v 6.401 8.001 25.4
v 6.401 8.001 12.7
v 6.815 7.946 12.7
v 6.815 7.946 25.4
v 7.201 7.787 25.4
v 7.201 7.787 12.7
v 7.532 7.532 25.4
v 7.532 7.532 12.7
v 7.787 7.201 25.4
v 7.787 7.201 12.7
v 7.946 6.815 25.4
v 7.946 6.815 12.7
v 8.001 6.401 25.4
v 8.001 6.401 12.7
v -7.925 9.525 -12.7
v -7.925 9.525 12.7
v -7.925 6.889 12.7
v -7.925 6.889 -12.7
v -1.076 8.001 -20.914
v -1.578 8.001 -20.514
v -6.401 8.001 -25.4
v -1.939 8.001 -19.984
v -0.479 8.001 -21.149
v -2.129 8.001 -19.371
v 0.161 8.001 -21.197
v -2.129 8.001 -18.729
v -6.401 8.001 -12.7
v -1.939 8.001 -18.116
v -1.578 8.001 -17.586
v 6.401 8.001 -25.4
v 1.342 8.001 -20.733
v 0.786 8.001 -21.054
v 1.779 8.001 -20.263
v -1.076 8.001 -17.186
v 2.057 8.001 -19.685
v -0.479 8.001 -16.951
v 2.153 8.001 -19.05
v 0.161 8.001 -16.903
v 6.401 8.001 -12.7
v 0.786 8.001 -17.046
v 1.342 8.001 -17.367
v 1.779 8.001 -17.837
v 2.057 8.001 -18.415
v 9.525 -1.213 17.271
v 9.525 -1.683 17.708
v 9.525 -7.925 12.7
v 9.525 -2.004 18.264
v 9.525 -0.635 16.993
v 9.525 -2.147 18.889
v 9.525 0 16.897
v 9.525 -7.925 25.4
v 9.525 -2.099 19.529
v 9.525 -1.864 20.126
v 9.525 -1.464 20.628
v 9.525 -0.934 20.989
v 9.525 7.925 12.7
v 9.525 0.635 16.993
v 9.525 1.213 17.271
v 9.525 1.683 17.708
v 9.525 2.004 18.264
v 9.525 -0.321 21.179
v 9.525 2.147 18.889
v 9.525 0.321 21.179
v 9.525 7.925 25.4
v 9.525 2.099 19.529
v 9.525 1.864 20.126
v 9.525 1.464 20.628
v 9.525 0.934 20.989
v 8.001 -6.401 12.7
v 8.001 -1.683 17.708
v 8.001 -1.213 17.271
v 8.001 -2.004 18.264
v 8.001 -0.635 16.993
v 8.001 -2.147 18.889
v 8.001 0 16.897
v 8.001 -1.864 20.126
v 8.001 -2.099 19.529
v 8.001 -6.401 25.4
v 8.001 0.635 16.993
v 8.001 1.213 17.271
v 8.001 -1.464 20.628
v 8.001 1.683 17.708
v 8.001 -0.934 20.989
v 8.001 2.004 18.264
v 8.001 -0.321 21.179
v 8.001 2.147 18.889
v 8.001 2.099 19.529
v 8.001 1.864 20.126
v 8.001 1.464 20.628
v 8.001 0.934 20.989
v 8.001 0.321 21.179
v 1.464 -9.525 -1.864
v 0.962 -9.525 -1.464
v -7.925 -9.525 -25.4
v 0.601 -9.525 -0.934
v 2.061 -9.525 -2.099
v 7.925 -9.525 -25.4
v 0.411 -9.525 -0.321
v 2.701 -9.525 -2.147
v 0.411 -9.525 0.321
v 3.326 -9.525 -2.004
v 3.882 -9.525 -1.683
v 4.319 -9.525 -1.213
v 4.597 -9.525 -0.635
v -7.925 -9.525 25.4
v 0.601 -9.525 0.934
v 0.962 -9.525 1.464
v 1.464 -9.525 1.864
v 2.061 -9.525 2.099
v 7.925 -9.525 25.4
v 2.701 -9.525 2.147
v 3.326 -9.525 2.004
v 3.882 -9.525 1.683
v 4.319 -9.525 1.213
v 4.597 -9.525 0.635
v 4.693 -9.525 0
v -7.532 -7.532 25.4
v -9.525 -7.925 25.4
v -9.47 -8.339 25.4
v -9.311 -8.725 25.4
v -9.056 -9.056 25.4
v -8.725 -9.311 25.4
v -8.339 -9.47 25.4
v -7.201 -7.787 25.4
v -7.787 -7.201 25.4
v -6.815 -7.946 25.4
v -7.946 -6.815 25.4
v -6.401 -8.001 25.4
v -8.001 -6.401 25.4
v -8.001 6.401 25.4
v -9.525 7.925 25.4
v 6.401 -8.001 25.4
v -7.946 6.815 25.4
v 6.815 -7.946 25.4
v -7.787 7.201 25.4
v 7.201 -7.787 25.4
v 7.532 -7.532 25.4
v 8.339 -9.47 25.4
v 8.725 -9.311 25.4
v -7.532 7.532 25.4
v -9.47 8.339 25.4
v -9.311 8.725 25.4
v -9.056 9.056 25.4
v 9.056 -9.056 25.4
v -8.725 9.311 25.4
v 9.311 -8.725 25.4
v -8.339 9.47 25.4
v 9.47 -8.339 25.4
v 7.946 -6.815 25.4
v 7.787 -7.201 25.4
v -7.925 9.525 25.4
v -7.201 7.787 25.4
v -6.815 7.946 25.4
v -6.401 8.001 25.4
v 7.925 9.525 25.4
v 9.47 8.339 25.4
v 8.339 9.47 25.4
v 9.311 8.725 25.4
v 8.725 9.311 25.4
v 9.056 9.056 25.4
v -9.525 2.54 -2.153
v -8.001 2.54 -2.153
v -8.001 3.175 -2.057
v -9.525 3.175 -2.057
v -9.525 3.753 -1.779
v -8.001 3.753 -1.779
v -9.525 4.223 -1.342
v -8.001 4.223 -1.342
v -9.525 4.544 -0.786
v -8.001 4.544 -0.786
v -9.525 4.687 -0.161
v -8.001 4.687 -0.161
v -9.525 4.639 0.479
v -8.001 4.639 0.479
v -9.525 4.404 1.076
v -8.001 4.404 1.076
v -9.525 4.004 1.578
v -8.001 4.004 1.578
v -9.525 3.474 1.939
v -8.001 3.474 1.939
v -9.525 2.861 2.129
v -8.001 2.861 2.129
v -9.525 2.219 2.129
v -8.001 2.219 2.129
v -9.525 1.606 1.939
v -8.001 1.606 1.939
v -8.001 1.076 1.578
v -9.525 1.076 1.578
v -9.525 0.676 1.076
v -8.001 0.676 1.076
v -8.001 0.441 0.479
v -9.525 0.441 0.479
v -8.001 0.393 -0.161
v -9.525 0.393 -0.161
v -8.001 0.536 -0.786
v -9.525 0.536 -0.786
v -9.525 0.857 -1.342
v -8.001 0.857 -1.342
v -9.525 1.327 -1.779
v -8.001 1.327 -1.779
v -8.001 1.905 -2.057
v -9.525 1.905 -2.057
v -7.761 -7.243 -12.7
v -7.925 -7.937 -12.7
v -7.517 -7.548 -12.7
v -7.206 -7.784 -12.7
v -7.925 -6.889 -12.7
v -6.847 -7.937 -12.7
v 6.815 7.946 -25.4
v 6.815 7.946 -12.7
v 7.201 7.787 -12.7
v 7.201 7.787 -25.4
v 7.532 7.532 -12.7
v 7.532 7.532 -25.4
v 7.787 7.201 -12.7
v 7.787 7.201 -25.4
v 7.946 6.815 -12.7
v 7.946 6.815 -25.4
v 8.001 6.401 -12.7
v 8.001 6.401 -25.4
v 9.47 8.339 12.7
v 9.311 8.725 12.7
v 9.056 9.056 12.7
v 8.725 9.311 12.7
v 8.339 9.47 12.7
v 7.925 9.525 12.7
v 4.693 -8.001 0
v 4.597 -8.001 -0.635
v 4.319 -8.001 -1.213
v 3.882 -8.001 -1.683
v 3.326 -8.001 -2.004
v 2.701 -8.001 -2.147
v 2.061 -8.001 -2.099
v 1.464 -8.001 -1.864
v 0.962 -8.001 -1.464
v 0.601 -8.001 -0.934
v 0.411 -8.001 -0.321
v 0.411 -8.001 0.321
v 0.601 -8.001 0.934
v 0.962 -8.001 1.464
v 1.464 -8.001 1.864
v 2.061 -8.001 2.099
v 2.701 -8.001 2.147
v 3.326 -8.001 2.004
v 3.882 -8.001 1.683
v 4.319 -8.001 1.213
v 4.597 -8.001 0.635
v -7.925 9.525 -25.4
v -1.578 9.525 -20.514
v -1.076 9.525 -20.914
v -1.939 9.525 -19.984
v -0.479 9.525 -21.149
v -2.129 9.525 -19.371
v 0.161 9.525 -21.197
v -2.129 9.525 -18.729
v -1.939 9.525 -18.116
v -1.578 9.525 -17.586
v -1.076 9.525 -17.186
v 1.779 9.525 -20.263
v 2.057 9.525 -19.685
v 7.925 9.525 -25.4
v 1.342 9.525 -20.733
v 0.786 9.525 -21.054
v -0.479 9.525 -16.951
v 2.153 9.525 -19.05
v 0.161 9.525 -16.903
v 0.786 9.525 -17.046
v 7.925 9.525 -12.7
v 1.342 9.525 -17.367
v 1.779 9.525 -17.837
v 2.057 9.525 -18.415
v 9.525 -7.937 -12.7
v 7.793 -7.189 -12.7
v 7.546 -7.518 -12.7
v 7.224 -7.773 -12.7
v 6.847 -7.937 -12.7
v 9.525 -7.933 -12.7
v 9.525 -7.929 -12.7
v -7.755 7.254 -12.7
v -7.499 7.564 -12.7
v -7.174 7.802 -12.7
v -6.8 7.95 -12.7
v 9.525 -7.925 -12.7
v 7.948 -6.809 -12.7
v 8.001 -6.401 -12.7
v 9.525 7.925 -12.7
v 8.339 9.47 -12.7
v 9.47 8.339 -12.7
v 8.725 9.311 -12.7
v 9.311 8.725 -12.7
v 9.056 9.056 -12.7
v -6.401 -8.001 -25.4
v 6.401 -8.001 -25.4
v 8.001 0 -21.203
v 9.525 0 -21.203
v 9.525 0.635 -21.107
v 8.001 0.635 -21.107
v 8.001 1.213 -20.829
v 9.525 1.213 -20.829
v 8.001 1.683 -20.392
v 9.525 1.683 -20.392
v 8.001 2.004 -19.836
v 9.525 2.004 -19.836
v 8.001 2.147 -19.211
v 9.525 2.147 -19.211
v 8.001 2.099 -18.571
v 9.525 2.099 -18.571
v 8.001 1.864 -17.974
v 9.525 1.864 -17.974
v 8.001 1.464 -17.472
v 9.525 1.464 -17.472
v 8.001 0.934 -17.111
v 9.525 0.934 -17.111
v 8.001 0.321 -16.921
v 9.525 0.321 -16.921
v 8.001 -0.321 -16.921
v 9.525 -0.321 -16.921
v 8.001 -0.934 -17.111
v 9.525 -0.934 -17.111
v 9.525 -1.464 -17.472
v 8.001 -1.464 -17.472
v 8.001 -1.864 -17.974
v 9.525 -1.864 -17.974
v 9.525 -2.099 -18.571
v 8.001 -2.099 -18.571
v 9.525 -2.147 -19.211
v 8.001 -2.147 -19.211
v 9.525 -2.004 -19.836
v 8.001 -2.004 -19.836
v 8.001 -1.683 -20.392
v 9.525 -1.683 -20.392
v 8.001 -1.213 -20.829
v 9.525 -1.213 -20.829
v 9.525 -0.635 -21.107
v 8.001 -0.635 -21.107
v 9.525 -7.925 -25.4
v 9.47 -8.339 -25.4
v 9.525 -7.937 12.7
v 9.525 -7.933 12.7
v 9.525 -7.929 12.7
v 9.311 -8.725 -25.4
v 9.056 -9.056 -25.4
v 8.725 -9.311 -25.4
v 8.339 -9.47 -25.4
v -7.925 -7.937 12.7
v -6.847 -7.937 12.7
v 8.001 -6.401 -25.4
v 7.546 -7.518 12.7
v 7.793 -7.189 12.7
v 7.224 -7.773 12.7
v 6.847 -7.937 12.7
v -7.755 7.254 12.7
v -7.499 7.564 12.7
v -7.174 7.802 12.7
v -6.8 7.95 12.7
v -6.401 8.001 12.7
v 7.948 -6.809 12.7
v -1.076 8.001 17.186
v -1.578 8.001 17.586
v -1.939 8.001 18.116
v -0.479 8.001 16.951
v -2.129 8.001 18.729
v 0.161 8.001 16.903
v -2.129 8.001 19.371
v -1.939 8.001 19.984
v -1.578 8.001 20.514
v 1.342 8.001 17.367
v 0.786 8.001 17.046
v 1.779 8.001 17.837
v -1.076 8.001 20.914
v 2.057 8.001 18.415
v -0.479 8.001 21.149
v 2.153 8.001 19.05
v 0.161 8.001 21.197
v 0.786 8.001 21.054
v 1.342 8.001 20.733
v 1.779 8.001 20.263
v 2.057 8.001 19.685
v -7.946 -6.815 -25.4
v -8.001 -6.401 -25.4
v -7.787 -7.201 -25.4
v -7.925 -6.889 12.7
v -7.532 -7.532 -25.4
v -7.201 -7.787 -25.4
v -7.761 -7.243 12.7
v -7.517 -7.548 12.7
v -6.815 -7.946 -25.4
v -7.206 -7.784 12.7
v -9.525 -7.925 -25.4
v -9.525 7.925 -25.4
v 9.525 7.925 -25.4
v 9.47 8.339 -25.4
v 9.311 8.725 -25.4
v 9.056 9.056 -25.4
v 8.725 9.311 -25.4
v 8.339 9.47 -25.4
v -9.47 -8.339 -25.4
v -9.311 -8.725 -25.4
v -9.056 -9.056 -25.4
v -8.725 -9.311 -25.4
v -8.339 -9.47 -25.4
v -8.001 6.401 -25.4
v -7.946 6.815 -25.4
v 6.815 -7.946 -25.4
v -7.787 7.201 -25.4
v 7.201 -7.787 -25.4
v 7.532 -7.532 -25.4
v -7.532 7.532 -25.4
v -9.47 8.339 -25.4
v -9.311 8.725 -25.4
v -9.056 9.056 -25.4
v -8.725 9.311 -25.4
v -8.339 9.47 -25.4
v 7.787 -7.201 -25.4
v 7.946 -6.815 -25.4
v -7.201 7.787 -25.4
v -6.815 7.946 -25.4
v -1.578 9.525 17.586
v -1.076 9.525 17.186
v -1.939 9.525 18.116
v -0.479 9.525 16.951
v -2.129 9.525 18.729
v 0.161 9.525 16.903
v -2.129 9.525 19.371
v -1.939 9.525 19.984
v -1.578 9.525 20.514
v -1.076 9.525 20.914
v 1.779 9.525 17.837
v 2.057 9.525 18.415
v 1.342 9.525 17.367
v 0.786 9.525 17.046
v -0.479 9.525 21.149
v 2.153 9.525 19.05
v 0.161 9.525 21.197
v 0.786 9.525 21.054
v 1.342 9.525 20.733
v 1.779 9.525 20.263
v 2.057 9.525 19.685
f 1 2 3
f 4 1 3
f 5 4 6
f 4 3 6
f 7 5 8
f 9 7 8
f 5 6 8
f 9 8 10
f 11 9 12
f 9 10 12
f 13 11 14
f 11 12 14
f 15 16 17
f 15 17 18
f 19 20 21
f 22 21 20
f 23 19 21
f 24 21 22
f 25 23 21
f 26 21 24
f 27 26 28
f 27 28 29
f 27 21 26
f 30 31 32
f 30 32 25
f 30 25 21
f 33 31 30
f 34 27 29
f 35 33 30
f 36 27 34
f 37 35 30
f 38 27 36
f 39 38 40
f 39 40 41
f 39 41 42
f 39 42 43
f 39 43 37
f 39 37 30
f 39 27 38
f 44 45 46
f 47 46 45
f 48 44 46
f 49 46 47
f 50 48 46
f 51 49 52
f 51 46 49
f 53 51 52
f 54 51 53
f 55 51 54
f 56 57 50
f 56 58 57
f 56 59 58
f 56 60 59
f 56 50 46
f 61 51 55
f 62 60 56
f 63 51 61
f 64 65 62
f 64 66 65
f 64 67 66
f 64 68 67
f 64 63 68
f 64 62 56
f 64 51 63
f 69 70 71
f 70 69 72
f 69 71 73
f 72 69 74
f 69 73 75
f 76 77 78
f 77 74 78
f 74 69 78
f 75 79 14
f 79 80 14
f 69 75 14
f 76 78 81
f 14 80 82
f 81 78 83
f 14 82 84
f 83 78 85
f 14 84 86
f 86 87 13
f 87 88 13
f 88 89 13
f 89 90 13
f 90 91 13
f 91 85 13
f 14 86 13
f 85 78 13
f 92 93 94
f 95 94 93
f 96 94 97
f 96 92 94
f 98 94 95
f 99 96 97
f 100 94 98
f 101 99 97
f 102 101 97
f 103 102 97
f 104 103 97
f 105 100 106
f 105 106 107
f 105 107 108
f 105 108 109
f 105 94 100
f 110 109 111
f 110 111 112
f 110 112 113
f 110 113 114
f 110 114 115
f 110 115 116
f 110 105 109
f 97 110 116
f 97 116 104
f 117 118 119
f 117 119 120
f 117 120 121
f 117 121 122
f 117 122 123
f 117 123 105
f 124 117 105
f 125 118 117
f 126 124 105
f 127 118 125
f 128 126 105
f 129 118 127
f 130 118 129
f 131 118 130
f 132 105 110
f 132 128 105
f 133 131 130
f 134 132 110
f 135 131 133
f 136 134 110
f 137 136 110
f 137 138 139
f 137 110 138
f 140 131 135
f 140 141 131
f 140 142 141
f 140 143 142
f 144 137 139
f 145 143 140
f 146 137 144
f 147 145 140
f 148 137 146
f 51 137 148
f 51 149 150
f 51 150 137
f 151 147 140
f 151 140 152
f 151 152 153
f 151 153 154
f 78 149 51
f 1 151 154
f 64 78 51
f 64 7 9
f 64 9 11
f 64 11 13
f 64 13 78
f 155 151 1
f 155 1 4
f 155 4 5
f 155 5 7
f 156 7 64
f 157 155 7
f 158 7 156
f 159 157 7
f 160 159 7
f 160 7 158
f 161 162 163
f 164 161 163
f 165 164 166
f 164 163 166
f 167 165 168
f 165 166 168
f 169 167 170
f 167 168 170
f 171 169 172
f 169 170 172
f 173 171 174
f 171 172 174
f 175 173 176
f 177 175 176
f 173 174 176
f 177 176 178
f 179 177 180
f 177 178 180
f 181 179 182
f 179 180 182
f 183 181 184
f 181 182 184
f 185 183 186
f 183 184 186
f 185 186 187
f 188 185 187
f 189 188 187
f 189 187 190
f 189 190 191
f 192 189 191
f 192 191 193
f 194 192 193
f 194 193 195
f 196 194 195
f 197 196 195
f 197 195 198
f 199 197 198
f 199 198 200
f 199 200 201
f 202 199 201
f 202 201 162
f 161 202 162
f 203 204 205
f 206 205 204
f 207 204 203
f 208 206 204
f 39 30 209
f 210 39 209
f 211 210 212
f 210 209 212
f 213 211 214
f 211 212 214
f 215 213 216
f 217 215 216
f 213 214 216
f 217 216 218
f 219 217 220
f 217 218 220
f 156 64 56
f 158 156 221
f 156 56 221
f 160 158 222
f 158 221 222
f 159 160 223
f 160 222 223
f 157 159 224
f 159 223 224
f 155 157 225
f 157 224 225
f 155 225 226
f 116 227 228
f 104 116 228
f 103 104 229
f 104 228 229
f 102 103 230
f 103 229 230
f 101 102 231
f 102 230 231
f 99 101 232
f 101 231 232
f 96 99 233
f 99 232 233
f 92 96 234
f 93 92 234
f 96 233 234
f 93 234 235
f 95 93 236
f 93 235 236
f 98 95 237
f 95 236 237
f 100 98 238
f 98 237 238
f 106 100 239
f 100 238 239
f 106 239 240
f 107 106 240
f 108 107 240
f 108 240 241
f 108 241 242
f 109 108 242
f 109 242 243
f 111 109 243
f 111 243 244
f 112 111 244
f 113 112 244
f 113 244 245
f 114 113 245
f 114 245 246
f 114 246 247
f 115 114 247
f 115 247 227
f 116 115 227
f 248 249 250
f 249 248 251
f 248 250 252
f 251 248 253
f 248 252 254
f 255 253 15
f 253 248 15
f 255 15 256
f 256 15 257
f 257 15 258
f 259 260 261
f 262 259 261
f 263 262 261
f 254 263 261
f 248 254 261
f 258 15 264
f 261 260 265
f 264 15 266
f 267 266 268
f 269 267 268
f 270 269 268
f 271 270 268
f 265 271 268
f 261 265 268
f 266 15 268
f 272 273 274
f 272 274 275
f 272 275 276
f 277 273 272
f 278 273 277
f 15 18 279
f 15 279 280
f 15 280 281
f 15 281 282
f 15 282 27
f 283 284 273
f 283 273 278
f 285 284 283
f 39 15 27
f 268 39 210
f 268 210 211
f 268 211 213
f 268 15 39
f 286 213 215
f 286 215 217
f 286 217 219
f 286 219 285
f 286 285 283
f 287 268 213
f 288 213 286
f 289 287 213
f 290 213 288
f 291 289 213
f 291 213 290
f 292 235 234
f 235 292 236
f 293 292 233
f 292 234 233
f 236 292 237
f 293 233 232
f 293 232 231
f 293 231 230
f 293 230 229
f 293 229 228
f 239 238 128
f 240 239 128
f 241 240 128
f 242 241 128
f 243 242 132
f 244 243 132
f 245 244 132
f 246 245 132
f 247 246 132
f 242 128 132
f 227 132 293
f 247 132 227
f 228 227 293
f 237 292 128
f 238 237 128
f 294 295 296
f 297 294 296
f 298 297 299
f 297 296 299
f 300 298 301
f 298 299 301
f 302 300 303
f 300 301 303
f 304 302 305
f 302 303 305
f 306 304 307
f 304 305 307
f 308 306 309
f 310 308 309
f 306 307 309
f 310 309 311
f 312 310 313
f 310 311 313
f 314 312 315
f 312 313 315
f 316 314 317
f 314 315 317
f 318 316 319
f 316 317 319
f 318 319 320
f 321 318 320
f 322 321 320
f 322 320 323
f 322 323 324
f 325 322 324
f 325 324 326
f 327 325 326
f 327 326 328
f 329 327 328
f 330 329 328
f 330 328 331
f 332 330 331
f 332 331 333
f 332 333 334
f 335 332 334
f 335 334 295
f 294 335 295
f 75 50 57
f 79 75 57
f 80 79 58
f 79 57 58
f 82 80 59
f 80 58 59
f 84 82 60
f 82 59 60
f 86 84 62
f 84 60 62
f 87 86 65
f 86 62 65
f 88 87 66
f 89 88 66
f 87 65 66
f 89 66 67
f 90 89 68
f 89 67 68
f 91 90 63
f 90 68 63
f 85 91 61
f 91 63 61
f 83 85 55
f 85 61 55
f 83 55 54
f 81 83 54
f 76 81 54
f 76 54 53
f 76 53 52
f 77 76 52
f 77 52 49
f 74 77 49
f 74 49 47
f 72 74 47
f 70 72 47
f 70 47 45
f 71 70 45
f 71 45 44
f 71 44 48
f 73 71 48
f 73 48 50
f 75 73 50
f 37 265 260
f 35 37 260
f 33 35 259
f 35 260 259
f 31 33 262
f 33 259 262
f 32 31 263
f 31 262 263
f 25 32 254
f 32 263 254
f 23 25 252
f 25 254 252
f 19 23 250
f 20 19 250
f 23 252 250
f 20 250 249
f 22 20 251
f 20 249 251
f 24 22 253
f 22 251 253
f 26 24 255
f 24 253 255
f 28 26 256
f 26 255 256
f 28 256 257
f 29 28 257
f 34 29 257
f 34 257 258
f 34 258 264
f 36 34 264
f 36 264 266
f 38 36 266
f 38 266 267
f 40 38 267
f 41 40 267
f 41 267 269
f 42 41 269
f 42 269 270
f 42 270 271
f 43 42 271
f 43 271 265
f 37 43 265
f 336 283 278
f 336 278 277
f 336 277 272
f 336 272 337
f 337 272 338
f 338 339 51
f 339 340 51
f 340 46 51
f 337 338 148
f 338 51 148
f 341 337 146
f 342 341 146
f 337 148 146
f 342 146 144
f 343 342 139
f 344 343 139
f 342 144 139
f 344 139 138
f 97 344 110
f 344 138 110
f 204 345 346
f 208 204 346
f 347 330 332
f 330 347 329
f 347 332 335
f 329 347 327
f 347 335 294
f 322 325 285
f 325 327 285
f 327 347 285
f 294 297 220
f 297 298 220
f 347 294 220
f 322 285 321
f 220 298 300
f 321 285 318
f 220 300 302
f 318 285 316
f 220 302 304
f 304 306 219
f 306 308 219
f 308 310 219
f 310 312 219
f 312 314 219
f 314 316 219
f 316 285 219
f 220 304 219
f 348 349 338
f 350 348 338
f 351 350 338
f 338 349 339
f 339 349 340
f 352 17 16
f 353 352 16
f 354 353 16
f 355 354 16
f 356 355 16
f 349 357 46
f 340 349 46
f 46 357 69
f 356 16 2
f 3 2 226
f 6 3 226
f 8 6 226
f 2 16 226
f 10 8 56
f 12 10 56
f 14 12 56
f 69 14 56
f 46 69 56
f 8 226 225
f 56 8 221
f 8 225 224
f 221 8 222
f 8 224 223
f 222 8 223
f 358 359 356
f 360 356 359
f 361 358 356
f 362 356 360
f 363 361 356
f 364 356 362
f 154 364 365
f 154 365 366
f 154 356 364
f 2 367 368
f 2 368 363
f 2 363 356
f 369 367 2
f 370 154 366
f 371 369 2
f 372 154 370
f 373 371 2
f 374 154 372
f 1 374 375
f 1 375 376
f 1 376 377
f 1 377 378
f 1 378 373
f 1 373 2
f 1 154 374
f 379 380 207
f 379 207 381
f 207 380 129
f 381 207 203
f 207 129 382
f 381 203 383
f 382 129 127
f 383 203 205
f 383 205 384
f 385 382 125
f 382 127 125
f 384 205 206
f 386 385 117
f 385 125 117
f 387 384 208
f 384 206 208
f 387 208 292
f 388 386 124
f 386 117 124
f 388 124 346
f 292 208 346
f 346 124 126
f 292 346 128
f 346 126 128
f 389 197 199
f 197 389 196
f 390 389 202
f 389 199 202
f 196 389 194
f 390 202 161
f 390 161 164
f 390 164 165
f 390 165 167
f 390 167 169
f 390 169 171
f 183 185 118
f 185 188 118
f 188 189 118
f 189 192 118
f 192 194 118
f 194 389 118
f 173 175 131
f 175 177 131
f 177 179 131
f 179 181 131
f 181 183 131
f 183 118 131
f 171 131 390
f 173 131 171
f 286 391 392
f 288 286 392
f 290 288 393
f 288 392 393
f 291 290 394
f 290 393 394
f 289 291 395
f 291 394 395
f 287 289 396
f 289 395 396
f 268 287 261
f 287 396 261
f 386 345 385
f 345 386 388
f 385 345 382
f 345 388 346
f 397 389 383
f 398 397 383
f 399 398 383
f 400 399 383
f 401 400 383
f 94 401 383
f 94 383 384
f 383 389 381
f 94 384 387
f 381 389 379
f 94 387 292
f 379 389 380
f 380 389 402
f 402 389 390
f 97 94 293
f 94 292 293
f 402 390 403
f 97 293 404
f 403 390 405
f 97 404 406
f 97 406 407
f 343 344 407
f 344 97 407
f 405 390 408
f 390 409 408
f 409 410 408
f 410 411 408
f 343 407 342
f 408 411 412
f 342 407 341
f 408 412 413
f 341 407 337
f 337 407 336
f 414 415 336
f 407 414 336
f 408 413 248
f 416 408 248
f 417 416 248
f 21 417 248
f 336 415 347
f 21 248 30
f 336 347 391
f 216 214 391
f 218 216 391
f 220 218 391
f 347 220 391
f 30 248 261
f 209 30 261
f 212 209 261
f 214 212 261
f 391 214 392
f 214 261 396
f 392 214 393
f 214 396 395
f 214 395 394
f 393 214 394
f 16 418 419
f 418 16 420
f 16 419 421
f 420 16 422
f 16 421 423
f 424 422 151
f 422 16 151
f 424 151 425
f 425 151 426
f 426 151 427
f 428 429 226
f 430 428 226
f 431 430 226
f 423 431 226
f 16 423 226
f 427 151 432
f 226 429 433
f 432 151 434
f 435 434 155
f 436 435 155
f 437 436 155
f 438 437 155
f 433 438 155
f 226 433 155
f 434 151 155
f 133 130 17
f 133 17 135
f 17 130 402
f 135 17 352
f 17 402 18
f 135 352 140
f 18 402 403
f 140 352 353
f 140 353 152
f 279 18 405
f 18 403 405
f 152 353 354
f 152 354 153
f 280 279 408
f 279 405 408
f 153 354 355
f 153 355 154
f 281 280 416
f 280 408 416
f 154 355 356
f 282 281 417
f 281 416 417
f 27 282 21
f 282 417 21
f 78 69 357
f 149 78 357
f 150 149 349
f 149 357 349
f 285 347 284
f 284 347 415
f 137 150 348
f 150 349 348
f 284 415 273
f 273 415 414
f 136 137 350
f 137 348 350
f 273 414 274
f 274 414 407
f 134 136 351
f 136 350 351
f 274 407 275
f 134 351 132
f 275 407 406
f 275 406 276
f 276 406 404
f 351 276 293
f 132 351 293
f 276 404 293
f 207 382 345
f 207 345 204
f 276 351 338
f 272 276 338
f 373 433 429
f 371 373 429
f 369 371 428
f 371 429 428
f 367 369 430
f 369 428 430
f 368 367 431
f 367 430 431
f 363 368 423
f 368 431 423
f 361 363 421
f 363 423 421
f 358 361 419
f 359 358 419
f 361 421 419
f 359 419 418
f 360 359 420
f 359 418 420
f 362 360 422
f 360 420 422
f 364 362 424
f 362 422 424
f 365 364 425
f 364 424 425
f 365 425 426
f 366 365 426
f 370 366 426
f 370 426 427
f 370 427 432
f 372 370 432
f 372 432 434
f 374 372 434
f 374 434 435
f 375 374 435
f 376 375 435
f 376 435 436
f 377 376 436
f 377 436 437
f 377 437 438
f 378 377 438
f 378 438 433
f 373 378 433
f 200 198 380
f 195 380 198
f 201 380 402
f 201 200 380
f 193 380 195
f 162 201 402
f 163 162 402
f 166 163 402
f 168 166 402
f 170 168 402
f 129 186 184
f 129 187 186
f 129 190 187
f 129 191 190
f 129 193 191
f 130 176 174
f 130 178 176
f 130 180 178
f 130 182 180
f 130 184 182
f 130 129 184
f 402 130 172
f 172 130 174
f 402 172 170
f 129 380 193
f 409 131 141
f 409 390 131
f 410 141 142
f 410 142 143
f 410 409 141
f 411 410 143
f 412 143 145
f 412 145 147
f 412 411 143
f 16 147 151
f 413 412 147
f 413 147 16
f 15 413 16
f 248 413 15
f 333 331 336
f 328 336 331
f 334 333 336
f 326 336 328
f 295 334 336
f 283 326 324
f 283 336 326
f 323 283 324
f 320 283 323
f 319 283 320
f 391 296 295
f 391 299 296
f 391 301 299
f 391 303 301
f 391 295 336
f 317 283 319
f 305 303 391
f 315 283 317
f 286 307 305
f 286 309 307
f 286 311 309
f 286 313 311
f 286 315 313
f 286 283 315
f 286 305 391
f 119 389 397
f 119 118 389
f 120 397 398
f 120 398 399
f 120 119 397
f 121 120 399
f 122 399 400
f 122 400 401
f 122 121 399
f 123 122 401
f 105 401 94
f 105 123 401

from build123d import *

# Parameters (mm, degrees)
SKETCH3_W                = 19.05
SKETCH3_H                = 19.05
SKETCH3_W_2              = 16.002
SKETCH3_H_2              = 16.002
BOSS_EXTRUDE1_DEPTH      = 25.4
BOSS_EXTRUDE1_DEPTH_BACK = 25.4
FILLET1_R                = 1.6002
SKETCH5_W                = 19.784949474
SKETCH5_H                = 25.4
CUT_EXTRUDE1_DEPTH       = 17.4625
SKETCH7_R                = 2.15265
CUT_EXTRUDE2_DEPTH       = 12.7
SKETCH6_R                = 2.15265
CUT_EXTRUDE3_DEPTH       = 2.524
SKETCH9_R                = 2.15265
CUT_EXTRUDE5_DEPTH       = 6.35
SKETCH10_R               = 2.15265
CUT_EXTRUDE6_DEPTH       = 20.05


with BuildPart() as part:
    # Sketch3 → Boss-Extrude1 (new body, two sides)
    with BuildSketch(Plane.XY) as boss_extrude1_sk:
        Rectangle(SKETCH3_W, SKETCH3_H)
        Rectangle(SKETCH3_W_2, SKETCH3_H_2, mode=Mode.SUBTRACT)
    extrude(amount=BOSS_EXTRUDE1_DEPTH)
    extrude(boss_extrude1_sk.sketch, amount=-BOSS_EXTRUDE1_DEPTH_BACK)

    # Fillet1
    fillet1_edges = [part.edges().sort_by_distance(p)[0] for p in [
        (8.001, -8.001, 0),
        (8.001, 8.001, 0),
        (-8.001, 8.001, 0),
        (-8.001, -8.001, 0),
        (9.525, -9.525, 0),
        (-9.525, -9.525, 0),
        (-9.525, 9.525, 0),
        (9.525, 9.525, 0),
    ]]
    fillet(fillet1_edges, radius=FILLET1_R)

    # Sketch5 → Cut-Extrude1 (cut)
    with BuildSketch(Plane(origin=(0, 9.525, 0), x_dir=(1, 0, 0), z_dir=(0, 1, 0))):
        with Locations((1.967674737, 0)):
            Rectangle(SKETCH5_W, SKETCH5_H)
    extrude(amount=-CUT_EXTRUDE1_DEPTH, mode=Mode.SUBTRACT)

    # Sketch7 → Cut-Extrude2 (cut)
    with BuildSketch(Plane(origin=(0, 9.525, 0), x_dir=(1, 0, 0), z_dir=(0, 1, 0))):
        with Locations((0, 19.05)):
            Circle(SKETCH7_R)
        with Locations((2.54, 0)):
            Circle(SKETCH7_R)
        with Locations((0, -19.05)):
            Circle(SKETCH7_R)
    extrude(amount=-CUT_EXTRUDE2_DEPTH, mode=Mode.SUBTRACT)

    # Sketch6 → Cut-Extrude3 (cut, through all)
    with BuildSketch(Plane(origin=(0, -8.001, 0), x_dir=(1, 0, 0), z_dir=(0, 1, 0))):
        with Locations((2.54, 0)):
            Circle(SKETCH6_R)
    extrude(amount=-CUT_EXTRUDE3_DEPTH, mode=Mode.SUBTRACT)

    # Sketch9 → Cut-Extrude5 (cut)
    with BuildSketch(Plane(origin=(9.525, 0, 0), x_dir=(0, 0, -1), z_dir=(1, 0, 0))):
        with Locations((-19.05, 0)):
            Circle(SKETCH9_R)
        with Locations((19.05, 0)):
            Circle(SKETCH9_R)
    extrude(amount=-CUT_EXTRUDE5_DEPTH, mode=Mode.SUBTRACT)

    # Sketch10 → Cut-Extrude6 (cut, through all)
    with BuildSketch(Plane(origin=(9.525, 0, 0), x_dir=(0, 0, -1), z_dir=(1, 0, 0))):
        with Locations((0, 2.54)):
            Circle(SKETCH10_R)
    extrude(amount=-CUT_EXTRUDE6_DEPTH, mode=Mode.SUBTRACT)


solid = part.part
